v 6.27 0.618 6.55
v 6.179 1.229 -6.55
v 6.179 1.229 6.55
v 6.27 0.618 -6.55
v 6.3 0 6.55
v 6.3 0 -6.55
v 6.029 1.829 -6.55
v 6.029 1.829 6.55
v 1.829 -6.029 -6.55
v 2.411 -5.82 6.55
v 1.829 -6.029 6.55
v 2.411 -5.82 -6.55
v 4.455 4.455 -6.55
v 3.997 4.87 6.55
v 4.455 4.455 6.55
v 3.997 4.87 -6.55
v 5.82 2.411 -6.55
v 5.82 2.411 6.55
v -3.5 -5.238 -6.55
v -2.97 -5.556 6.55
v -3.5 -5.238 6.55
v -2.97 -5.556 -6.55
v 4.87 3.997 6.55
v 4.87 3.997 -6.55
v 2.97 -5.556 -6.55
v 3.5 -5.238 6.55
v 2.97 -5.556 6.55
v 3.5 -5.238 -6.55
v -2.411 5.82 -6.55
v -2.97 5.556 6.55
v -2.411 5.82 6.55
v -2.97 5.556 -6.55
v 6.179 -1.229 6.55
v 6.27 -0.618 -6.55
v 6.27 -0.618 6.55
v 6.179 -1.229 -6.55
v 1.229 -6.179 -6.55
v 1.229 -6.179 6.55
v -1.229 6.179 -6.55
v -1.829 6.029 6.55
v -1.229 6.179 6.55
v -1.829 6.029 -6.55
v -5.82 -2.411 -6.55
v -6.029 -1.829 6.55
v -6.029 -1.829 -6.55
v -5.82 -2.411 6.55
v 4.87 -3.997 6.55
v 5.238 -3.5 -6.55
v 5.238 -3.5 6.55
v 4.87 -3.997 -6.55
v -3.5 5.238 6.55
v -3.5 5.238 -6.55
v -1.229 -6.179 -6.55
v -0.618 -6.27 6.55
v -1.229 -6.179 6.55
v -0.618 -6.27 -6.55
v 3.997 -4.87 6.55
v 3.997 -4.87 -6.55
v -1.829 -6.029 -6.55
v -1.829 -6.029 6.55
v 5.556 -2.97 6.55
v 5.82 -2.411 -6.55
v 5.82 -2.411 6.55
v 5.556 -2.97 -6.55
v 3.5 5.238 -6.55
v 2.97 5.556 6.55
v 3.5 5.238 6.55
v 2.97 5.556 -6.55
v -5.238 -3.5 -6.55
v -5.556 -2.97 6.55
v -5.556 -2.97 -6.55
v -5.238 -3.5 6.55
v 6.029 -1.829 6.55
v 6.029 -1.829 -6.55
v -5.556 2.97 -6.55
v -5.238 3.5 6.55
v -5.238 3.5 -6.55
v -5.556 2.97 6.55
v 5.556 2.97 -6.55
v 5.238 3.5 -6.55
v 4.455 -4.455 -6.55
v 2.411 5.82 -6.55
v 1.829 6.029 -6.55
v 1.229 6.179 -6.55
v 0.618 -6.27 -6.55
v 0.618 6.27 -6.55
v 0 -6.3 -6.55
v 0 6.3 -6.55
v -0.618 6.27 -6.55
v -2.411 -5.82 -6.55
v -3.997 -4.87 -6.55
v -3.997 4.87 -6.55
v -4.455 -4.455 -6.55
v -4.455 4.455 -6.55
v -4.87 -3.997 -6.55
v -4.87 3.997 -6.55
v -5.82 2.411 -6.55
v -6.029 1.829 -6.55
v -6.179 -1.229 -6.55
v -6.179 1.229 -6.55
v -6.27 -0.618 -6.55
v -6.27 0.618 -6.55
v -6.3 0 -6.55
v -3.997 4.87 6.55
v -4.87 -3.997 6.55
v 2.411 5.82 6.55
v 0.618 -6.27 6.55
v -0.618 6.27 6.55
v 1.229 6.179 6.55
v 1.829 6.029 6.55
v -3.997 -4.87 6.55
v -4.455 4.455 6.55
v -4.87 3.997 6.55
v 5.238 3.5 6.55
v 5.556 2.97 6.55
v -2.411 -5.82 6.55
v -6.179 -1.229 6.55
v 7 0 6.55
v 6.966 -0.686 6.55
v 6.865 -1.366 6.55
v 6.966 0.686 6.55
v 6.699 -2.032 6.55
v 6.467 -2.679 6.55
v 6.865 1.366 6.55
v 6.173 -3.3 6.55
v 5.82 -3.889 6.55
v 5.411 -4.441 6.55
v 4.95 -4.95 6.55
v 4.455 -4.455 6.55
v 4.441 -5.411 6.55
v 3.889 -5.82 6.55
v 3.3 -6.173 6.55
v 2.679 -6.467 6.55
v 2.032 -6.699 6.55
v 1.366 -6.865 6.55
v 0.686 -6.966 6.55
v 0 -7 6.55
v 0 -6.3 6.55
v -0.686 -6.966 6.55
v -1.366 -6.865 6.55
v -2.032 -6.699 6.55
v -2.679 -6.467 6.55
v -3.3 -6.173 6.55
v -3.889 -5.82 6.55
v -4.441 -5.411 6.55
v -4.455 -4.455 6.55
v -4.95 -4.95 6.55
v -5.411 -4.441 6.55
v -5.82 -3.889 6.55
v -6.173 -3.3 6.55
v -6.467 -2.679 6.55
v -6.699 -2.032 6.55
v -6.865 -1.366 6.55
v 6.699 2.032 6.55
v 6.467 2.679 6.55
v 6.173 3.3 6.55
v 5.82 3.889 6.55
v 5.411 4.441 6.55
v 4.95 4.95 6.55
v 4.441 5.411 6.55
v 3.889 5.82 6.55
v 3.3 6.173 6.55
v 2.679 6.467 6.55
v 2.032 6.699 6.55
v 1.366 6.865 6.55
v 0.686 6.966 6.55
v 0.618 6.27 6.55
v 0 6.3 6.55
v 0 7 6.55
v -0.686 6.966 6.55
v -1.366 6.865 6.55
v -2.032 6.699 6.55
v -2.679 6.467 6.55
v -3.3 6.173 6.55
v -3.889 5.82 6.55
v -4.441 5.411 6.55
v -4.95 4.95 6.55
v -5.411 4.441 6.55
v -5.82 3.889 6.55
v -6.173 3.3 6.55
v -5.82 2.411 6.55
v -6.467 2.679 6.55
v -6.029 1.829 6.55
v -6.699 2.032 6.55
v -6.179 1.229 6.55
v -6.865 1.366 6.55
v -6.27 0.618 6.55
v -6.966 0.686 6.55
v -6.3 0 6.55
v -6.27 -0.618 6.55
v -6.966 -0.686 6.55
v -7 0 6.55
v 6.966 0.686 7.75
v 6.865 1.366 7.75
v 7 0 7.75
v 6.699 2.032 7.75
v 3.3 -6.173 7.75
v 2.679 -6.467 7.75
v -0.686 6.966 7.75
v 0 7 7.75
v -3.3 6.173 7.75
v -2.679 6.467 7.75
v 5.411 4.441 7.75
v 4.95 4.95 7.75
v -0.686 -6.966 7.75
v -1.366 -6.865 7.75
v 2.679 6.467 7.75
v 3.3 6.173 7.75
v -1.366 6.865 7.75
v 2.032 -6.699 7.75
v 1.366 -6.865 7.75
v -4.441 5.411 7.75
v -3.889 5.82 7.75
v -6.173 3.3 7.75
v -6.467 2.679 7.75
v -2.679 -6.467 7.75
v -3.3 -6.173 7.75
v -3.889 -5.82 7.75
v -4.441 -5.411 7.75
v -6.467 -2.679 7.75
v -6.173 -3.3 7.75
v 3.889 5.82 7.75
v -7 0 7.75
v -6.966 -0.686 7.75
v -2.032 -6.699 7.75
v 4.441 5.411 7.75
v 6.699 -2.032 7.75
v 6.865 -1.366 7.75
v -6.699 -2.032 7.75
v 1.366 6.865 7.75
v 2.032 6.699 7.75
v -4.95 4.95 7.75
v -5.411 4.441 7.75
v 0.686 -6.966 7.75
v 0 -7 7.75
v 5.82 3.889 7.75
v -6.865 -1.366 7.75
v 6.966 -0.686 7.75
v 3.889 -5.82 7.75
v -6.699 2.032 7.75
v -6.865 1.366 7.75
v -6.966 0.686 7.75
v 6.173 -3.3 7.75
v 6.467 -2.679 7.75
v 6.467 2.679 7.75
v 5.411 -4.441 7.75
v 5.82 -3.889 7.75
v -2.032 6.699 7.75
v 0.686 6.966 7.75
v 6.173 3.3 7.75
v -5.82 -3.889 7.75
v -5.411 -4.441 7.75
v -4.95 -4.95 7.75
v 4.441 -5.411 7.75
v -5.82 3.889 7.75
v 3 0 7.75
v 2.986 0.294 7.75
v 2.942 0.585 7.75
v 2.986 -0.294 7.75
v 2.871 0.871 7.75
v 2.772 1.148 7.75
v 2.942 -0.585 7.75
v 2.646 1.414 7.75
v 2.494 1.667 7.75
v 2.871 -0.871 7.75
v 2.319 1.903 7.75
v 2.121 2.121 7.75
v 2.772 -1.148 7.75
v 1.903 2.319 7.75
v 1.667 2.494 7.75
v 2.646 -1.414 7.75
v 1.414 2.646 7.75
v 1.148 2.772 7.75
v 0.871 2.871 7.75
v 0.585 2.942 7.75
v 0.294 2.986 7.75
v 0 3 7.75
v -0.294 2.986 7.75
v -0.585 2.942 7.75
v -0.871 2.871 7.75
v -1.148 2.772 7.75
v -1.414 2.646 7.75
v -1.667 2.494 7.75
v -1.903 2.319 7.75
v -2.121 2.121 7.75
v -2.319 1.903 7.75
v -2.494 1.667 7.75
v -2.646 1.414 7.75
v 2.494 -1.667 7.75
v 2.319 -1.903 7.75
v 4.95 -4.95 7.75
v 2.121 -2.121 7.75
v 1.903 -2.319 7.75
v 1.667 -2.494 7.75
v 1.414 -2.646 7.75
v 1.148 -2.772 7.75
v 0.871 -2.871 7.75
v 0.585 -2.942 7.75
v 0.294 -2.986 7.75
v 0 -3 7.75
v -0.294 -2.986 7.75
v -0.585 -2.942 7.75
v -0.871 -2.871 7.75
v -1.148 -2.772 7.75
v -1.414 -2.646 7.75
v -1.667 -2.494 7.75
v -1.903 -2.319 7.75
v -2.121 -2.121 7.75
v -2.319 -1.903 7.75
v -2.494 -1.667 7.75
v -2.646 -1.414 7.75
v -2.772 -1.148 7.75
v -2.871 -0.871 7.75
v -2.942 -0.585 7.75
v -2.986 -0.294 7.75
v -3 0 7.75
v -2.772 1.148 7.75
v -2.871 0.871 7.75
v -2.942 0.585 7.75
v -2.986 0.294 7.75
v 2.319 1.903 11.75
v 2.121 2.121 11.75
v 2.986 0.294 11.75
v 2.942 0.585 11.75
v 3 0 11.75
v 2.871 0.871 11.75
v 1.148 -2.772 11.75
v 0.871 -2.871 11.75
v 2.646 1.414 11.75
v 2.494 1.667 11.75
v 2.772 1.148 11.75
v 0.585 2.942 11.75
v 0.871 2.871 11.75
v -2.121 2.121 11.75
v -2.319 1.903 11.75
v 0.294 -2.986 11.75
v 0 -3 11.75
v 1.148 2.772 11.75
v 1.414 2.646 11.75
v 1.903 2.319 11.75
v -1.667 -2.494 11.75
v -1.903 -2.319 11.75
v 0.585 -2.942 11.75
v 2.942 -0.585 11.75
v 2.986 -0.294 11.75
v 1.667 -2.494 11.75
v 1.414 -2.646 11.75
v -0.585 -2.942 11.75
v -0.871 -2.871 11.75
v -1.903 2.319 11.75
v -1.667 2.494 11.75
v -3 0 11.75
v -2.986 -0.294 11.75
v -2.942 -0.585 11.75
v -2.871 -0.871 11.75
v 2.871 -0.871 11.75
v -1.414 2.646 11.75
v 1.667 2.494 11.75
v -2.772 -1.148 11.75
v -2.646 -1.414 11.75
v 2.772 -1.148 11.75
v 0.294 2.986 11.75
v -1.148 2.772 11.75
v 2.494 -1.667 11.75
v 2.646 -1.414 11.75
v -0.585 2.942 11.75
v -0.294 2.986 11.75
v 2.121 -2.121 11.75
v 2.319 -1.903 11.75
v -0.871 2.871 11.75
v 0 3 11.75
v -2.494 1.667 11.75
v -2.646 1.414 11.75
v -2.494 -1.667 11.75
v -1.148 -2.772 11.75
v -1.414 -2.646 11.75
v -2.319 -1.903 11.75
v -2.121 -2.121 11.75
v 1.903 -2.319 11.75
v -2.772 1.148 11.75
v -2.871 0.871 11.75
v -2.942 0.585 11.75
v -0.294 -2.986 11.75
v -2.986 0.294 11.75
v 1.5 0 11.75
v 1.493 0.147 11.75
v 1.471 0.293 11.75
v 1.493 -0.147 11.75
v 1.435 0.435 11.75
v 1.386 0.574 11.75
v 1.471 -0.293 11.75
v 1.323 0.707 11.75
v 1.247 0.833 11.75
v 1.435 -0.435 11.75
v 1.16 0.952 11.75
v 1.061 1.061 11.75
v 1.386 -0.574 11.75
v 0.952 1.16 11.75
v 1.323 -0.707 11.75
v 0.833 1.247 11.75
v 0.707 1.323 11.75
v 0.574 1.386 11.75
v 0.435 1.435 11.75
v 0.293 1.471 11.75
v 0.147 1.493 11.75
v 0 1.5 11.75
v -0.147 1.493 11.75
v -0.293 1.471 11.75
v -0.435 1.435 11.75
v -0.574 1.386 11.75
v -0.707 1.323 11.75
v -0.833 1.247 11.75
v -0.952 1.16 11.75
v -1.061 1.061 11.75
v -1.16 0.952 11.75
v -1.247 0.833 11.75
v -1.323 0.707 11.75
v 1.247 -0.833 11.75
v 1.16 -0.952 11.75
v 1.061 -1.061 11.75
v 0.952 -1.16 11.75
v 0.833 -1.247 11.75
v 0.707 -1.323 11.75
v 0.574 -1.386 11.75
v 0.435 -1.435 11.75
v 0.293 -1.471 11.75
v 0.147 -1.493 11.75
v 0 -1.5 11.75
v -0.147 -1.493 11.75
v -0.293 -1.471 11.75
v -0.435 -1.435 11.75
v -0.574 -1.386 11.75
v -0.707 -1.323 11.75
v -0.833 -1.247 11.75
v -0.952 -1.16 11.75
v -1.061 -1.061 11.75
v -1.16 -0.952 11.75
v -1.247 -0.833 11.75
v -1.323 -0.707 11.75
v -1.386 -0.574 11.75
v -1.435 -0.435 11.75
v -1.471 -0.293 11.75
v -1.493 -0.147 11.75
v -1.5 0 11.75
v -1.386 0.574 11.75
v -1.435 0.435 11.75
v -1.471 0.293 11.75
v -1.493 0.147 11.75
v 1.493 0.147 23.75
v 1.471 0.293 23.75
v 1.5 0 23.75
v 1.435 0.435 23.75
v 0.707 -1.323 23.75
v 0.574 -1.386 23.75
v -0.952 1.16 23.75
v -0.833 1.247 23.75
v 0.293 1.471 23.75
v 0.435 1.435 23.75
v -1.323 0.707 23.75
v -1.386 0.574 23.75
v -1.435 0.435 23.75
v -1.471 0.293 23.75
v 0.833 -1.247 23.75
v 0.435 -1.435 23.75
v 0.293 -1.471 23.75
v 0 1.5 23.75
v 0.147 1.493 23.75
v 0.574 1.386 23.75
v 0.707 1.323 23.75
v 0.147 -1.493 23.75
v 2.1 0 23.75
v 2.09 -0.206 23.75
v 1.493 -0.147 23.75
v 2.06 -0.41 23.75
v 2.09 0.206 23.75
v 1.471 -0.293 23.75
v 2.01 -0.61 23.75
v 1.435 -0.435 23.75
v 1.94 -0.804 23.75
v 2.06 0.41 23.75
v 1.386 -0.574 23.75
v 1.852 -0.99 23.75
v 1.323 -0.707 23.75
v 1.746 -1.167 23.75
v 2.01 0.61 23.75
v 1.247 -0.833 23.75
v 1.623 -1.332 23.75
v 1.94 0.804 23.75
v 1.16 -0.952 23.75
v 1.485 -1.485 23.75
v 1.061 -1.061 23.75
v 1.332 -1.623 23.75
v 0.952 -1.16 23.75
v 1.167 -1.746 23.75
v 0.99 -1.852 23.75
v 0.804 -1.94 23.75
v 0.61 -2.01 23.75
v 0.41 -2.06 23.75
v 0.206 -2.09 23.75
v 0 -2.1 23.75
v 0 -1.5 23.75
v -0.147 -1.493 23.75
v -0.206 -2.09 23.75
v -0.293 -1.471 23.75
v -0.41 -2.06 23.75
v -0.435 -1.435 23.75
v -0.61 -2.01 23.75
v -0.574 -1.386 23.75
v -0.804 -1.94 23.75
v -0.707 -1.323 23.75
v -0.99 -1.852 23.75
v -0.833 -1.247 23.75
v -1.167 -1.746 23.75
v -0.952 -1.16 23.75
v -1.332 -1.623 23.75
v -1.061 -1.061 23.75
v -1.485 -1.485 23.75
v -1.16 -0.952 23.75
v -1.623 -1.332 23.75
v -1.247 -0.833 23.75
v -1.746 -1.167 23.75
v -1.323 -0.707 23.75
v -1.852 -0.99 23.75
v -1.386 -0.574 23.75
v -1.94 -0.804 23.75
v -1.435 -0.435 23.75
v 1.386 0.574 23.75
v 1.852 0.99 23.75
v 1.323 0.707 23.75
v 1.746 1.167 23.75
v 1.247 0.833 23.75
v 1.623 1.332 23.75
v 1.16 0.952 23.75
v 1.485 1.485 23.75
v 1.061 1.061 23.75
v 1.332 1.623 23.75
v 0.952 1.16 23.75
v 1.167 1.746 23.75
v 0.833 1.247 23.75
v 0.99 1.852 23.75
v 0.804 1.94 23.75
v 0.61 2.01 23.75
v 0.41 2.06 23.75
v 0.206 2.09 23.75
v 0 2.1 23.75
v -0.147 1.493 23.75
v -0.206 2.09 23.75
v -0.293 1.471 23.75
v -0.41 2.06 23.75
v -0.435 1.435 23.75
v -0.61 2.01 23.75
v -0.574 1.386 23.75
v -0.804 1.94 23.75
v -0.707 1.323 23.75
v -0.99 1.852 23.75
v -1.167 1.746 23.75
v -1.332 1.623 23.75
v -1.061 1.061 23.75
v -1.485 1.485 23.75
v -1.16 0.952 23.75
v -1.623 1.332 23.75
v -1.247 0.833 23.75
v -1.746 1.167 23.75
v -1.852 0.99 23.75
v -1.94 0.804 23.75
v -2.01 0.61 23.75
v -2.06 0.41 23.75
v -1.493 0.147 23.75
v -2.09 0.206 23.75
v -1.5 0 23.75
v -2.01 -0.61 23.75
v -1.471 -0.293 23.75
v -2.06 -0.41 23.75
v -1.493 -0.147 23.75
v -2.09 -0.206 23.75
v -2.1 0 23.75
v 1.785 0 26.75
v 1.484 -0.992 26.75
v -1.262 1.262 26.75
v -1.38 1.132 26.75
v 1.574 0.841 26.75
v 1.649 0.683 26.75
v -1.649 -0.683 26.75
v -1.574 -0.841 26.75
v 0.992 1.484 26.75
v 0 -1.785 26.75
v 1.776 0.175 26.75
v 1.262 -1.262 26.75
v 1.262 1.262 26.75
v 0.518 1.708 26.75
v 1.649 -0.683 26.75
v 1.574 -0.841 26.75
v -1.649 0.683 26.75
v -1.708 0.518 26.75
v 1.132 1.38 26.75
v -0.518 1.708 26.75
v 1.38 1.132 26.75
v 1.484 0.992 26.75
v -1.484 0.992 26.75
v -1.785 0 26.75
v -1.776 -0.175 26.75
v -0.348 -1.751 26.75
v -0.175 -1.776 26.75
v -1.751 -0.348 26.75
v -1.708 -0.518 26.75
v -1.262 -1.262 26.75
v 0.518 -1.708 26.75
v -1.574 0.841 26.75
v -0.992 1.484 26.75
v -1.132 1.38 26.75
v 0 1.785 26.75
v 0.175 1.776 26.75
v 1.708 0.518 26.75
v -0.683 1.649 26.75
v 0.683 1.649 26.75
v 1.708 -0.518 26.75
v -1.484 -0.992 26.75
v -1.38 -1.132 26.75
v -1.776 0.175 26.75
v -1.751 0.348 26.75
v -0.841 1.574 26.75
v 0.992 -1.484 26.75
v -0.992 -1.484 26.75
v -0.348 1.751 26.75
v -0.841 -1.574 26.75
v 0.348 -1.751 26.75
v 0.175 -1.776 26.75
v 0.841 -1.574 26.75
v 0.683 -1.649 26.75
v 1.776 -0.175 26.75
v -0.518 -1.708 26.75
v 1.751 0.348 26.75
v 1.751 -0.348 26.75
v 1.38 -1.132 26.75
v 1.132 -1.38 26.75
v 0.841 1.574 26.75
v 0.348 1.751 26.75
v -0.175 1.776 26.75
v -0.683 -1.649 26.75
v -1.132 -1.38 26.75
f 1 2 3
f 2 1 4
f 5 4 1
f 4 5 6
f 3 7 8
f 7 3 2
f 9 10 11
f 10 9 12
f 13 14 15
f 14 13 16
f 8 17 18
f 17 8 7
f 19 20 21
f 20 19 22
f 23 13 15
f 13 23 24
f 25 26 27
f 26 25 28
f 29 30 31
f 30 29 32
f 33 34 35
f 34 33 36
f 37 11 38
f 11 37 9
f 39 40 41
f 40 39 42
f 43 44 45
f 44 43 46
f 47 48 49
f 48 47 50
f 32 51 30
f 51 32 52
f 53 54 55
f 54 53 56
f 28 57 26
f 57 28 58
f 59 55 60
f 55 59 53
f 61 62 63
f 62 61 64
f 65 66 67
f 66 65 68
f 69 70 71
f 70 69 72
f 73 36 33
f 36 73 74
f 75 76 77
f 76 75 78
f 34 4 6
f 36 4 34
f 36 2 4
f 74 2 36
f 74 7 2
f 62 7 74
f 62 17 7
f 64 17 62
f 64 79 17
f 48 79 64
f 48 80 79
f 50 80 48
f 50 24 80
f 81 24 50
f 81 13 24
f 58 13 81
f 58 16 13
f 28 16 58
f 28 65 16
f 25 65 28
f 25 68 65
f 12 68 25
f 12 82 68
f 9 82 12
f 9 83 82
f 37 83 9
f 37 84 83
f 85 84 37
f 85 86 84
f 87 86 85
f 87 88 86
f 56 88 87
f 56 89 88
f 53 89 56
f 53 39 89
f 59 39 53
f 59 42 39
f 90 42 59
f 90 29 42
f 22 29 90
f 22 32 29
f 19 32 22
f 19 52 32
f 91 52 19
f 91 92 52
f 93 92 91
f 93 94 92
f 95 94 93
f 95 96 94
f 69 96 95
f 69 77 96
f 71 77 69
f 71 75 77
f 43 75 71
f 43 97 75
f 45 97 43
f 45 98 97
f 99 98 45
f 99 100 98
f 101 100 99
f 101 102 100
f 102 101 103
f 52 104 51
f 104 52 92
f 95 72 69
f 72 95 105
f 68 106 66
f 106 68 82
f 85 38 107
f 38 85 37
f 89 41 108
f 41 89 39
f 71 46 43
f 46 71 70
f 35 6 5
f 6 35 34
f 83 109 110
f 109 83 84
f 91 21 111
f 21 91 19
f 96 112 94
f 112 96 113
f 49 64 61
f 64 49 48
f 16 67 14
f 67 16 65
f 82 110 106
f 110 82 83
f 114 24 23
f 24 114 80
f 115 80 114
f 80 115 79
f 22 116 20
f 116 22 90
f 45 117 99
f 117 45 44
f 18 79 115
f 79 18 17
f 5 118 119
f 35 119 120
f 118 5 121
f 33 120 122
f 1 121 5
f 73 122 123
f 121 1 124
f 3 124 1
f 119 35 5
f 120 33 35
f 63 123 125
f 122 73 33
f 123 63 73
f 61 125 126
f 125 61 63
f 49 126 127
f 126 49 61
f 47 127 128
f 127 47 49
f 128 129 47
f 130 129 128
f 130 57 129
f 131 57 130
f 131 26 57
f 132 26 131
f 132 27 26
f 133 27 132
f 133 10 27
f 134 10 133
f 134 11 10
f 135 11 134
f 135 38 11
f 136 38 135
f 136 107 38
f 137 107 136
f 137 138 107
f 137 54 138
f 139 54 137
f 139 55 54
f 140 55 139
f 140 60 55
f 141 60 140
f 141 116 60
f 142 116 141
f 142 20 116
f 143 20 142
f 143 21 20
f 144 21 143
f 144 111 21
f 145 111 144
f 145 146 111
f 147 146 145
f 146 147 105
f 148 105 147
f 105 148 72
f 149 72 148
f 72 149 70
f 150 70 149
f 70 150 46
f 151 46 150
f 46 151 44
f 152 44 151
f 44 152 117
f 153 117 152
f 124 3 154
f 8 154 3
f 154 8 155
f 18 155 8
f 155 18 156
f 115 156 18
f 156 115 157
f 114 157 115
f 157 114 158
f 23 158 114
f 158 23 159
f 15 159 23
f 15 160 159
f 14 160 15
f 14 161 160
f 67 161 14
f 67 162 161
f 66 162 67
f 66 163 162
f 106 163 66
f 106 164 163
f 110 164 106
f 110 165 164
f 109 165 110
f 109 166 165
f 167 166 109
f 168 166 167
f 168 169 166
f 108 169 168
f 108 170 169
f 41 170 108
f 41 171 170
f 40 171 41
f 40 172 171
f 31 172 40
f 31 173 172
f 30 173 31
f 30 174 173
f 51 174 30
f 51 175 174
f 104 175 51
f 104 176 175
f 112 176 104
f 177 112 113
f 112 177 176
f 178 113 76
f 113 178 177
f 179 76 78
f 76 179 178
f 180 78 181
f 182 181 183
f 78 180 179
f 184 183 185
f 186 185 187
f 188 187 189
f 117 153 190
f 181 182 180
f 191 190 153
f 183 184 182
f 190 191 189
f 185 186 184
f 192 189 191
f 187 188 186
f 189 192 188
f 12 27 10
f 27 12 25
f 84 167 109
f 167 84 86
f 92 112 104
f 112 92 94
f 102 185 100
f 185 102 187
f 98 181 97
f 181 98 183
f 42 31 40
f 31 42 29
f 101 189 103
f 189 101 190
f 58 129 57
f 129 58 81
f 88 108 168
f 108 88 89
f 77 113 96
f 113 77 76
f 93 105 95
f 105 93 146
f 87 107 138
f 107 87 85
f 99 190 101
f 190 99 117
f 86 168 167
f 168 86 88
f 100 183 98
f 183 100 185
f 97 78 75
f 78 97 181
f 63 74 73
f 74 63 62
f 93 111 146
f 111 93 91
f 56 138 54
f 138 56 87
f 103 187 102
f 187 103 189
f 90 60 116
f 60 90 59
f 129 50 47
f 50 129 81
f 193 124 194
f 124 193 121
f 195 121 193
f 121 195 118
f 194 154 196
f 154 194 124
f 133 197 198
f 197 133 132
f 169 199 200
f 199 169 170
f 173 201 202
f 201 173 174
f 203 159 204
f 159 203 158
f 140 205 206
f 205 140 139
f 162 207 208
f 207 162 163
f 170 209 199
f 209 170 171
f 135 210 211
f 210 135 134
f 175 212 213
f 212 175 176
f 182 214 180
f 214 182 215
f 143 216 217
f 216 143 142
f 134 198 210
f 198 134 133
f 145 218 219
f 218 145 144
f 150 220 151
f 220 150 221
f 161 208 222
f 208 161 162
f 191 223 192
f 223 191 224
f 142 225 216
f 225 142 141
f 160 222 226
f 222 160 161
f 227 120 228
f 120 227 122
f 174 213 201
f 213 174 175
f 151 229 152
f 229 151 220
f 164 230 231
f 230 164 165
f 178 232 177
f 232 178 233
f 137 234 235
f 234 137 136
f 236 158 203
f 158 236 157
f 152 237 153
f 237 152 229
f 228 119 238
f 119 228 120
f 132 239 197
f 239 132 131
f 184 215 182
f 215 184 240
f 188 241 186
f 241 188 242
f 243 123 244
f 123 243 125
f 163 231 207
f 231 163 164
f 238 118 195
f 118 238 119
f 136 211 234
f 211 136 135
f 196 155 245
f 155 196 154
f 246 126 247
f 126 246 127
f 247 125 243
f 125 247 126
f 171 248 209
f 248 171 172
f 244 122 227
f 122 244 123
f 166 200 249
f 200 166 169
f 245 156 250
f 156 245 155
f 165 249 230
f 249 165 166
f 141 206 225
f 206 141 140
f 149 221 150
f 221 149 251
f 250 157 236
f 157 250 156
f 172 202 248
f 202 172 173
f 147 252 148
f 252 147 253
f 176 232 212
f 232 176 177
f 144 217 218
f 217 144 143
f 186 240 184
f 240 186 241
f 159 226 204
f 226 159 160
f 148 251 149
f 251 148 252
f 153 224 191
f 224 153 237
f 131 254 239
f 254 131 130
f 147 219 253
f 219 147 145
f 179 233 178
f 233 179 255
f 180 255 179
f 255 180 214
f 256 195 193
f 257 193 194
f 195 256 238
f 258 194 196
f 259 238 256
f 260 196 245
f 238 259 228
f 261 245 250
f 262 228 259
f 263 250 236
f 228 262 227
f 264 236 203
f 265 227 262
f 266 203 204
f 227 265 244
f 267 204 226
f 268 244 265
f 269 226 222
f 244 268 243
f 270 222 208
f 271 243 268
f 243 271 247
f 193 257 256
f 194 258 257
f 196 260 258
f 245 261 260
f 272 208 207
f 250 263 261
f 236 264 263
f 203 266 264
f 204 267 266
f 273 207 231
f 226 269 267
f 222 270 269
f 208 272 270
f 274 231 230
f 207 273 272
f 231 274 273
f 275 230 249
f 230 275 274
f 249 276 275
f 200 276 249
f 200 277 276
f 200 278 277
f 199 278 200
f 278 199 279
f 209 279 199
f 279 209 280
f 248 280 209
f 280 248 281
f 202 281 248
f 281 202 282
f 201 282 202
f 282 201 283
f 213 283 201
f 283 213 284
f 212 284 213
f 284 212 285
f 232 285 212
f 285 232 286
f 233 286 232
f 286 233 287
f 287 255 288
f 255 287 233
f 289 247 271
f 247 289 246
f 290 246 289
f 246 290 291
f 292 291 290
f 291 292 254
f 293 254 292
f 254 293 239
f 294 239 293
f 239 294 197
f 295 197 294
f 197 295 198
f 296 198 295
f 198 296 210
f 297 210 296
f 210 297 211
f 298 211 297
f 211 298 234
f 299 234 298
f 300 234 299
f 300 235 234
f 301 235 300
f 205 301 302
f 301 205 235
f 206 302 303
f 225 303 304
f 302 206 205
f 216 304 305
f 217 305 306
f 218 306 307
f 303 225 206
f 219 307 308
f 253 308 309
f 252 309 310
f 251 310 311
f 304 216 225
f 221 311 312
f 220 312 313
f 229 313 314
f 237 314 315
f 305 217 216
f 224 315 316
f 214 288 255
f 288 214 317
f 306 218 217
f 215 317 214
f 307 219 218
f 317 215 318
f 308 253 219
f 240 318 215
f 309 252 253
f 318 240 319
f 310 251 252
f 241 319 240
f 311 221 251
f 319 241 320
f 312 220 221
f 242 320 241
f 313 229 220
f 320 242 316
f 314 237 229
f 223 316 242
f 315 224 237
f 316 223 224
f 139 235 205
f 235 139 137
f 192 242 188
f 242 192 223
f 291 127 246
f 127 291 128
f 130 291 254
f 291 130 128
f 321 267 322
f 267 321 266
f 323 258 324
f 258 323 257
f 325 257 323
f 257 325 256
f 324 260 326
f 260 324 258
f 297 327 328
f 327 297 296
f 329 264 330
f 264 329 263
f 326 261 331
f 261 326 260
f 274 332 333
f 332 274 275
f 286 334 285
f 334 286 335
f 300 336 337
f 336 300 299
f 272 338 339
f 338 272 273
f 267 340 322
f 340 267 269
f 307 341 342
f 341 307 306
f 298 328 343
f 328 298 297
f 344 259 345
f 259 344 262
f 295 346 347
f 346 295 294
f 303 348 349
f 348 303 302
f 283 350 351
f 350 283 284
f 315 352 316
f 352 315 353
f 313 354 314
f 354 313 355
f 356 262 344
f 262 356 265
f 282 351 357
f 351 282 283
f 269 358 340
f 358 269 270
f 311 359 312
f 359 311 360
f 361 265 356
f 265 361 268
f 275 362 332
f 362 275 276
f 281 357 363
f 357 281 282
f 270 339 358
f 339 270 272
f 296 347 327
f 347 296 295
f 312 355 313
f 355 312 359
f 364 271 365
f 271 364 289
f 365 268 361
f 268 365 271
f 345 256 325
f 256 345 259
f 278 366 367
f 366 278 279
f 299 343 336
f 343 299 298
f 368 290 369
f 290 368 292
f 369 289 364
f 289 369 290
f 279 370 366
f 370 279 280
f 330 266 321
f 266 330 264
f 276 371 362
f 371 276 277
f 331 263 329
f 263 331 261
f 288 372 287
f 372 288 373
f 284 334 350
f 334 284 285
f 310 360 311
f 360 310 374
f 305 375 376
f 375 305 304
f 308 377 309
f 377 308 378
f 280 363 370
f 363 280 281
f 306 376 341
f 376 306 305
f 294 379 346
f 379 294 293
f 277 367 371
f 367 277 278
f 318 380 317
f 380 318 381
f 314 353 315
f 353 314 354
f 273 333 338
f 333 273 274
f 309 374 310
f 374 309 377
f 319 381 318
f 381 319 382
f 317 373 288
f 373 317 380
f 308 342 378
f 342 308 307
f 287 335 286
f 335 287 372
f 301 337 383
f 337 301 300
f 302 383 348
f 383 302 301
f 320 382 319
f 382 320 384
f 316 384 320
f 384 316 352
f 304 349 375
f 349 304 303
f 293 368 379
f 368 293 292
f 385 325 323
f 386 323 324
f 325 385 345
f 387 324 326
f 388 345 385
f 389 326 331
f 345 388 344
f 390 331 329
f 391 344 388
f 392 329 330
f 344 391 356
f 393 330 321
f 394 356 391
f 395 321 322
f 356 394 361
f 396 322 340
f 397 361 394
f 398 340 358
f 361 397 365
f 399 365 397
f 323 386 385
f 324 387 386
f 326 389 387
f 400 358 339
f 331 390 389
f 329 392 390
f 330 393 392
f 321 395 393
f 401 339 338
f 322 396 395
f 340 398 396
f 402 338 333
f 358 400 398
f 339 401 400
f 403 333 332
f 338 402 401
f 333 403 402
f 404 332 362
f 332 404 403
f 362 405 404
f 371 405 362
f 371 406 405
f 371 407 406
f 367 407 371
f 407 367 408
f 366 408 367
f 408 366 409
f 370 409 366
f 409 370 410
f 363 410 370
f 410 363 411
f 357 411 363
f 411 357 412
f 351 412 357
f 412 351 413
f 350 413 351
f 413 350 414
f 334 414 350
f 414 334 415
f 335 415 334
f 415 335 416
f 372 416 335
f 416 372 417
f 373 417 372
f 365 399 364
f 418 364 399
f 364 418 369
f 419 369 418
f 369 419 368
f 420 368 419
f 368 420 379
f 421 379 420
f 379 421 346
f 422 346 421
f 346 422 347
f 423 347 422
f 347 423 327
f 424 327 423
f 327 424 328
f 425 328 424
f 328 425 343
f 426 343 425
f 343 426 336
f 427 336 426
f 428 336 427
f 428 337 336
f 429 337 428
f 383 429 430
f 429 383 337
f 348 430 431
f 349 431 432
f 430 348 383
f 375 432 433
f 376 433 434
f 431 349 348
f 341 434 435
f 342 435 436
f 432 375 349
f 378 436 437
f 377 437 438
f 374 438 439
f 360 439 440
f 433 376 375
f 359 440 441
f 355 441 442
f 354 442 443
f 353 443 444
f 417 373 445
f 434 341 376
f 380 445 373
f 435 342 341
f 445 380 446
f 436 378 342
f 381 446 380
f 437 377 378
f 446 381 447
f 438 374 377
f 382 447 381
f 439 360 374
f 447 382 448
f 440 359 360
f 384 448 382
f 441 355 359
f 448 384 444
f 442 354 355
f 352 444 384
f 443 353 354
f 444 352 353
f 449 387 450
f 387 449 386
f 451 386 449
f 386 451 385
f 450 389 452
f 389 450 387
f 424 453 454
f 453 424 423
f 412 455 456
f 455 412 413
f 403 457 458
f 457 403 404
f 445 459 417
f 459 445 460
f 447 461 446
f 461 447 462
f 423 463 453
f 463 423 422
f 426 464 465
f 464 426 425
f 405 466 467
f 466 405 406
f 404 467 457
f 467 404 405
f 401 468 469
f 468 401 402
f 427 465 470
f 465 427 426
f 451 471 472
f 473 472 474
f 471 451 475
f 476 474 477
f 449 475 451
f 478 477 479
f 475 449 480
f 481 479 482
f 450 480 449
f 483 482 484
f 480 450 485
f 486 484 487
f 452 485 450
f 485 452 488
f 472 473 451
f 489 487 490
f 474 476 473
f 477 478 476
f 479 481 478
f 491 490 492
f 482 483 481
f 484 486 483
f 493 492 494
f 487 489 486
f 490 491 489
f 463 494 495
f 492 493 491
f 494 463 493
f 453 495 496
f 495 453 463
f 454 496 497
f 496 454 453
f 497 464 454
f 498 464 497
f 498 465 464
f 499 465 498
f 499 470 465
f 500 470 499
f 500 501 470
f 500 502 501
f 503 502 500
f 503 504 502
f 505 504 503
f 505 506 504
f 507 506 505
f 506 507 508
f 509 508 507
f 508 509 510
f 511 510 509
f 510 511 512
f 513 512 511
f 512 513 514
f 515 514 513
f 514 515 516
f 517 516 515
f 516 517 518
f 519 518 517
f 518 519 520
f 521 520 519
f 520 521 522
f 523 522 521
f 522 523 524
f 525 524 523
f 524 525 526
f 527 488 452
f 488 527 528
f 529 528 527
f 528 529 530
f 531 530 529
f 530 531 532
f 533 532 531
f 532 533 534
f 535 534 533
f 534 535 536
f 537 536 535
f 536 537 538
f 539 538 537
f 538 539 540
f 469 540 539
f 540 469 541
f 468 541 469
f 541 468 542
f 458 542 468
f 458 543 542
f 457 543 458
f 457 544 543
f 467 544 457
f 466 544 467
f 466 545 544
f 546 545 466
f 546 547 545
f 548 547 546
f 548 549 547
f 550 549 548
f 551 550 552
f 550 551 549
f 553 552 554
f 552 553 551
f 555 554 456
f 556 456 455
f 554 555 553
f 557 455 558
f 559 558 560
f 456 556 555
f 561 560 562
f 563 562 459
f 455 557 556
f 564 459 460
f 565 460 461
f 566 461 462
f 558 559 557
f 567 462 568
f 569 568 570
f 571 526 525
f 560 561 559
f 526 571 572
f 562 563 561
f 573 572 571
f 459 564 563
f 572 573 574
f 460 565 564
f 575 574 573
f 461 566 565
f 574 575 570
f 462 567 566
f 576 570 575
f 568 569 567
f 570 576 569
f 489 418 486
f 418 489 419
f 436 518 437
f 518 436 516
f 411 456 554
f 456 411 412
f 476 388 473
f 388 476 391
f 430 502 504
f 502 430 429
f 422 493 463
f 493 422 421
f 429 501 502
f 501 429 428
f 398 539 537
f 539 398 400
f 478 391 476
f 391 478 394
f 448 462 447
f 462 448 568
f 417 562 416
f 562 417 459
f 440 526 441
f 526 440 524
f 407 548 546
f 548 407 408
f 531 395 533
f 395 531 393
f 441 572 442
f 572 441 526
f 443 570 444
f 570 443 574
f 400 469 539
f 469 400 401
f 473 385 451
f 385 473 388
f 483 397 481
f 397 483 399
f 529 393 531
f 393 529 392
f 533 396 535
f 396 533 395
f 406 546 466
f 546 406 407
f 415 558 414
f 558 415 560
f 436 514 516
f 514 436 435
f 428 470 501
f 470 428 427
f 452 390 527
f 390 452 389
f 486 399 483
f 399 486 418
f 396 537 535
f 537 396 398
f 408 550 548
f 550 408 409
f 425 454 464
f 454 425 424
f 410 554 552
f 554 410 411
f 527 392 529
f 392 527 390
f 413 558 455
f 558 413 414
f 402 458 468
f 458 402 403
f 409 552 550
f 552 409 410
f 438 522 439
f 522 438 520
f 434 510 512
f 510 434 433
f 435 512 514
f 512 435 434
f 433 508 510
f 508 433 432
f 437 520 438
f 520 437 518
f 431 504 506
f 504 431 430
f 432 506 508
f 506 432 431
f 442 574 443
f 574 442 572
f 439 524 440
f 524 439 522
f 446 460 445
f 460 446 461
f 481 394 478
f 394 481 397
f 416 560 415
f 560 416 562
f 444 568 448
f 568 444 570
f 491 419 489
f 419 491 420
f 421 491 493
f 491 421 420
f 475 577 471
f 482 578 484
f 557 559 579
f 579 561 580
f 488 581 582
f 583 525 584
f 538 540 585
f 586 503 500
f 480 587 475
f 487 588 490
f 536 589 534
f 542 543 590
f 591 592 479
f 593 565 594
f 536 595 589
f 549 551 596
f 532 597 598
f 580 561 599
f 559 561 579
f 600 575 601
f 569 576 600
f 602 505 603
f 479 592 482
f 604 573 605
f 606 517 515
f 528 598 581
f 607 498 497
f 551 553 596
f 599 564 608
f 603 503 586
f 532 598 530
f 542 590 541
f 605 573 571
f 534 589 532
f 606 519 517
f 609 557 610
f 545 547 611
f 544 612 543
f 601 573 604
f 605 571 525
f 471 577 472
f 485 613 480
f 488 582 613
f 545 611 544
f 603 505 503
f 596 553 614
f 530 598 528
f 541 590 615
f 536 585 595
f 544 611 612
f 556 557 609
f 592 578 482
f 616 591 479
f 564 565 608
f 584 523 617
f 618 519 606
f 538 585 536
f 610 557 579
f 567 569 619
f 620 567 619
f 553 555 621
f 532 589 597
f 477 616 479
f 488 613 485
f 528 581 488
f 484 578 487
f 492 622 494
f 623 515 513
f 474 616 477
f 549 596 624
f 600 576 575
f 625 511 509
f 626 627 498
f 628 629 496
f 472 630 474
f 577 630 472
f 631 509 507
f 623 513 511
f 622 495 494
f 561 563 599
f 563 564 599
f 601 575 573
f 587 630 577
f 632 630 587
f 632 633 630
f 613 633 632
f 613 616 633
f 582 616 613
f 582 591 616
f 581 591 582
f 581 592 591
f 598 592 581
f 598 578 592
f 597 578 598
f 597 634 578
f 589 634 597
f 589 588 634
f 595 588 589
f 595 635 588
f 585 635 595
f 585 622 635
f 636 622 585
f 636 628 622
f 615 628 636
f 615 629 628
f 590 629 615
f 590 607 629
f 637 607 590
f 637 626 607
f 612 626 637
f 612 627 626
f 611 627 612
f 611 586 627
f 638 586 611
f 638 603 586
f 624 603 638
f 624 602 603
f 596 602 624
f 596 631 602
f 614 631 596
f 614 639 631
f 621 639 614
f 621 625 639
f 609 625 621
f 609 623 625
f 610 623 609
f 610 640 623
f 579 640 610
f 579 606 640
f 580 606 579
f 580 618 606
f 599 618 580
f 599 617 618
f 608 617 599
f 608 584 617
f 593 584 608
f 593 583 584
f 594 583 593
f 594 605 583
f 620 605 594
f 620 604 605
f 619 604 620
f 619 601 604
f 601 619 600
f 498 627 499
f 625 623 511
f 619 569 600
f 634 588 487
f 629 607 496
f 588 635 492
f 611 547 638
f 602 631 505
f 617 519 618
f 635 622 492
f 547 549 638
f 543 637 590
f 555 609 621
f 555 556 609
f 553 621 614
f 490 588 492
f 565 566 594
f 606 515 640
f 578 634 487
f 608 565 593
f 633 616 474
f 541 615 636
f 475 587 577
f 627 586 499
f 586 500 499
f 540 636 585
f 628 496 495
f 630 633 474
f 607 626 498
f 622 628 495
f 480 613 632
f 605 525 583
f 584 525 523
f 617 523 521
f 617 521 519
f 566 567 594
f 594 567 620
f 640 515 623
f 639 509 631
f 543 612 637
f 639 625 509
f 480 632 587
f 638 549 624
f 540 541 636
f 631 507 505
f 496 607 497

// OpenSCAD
$fn=64;

body_d = 12.6;
body_h = 13.1;

bushing_d = 6.0;
bushing_h = 4.0;

lever_d = 3.0;
lever_h = 12.0;

tip_d = 4.2;
tip_h = 3.0;

base_flange_d = 14.0;
base_flange_h = 1.2;

module toggle_switch() {
    union() {
        translate([0,0,-body_h/2])
            cylinder(d=body_d, h=body_h);

        translate([0,0,body_h/2])
            cylinder(d=base_flange_d, h=base_flange_h);

        translate([0,0,body_h/2 + base_flange_h])
            cylinder(d=bushing_d, h=bushing_h);

        translate([0,0,body_h/2 + base_flange_h + bushing_h])
            cylinder(d=lever_d, h=lever_h);

        translate([0,0,body_h/2 + base_flange_h + bushing_h + lever_h])
            cylinder(d1=tip_d, d2=tip_d*0.85, h=tip_h);
    }
}

toggle_switch();
